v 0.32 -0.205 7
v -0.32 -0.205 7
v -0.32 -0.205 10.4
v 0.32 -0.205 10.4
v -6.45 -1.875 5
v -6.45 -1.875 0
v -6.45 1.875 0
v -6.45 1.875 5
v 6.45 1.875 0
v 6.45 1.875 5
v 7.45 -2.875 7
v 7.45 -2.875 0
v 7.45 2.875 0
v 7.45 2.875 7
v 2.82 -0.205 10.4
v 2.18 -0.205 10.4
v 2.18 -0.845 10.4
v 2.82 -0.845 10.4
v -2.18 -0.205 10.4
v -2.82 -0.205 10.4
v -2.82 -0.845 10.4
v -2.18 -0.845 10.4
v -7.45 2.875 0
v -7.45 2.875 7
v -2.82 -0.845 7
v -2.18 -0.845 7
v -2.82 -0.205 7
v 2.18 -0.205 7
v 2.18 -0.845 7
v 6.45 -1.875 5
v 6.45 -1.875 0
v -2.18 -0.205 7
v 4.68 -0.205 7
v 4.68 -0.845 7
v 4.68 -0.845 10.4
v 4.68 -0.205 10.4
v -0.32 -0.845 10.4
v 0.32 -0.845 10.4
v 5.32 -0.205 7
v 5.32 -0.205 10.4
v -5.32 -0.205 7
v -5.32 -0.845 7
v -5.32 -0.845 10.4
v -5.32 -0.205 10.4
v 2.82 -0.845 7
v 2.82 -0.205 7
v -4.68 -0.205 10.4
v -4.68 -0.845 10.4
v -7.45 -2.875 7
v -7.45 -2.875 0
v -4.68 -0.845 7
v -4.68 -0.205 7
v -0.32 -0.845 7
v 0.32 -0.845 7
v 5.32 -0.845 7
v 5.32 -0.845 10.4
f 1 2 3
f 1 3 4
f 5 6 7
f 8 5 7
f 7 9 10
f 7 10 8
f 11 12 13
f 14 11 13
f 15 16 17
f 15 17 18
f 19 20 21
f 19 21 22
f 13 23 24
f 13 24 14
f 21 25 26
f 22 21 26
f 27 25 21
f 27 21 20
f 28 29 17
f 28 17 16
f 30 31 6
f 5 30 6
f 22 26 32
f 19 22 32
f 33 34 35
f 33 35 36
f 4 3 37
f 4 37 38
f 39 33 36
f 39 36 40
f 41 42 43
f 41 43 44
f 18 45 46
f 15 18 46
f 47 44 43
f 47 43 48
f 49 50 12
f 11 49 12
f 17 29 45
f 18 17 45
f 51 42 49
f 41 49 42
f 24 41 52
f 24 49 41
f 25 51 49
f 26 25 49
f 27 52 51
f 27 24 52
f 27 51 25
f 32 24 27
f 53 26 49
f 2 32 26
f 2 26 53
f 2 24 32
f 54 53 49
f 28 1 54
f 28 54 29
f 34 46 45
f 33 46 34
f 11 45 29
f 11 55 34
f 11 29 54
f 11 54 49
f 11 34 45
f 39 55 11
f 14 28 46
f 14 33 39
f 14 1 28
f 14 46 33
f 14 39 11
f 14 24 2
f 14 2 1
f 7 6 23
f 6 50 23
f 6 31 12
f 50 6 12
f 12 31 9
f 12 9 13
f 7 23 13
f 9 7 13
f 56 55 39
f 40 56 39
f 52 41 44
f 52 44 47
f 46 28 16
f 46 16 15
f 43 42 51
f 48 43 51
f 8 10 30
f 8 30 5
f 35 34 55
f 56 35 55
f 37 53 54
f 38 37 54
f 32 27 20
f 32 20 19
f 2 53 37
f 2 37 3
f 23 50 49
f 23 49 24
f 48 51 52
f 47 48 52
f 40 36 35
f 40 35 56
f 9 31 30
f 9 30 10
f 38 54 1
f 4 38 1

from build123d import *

# Parameters (mm, degrees)
SKETCH_1_W          = 14.9
SKETCH_1_H          = 5.75
EXTRUDE_1_DEPTH     = 7
SKETCH_2_W          = 0.64
SKETCH_2_H          = 0.64
EXTRUDE_2_DEPTH     = 3.4
SKETCH_3_W          = 12.9
SKETCH_3_H          = 3.75
CUT_EXTRUDE_1_DEPTH = 5


with BuildPart() as part:
    # Эскиз1 → Бобышка-Вытянуть1 (new body)
    with BuildSketch(Plane.XY):
        Rectangle(SKETCH_1_W, SKETCH_1_H)
    extrude(amount=EXTRUDE_1_DEPTH)

    # Эскиз2 → Бобышка-Вытянуть2 (add)
    with BuildSketch(Plane.XY.offset(7)):
        with Locations((-2.5, -0.525)):
            Rectangle(SKETCH_2_W, SKETCH_2_H)
        with Locations((-5, -0.525)):
            Rectangle(SKETCH_2_W, SKETCH_2_H)
        with Locations((0, -0.525)):
            Rectangle(SKETCH_2_W, SKETCH_2_H)
        with Locations((2.5, -0.525)):
            Rectangle(SKETCH_2_W, SKETCH_2_H)
        with Locations((5, -0.525)):
            Rectangle(SKETCH_2_W, SKETCH_2_H)
    extrude(amount=EXTRUDE_2_DEPTH)

    # Эскиз3 → Вырез-Вытянуть1 (cut)
    with BuildSketch(Plane(origin=(0, 0, 0), x_dir=(-1, 0, 0), z_dir=(0, 0, -1))):
        Rectangle(SKETCH_3_W, SKETCH_3_H)
    extrude(amount=-CUT_EXTRUDE_1_DEPTH, mode=Mode.SUBTRACT)


solid = part.part
